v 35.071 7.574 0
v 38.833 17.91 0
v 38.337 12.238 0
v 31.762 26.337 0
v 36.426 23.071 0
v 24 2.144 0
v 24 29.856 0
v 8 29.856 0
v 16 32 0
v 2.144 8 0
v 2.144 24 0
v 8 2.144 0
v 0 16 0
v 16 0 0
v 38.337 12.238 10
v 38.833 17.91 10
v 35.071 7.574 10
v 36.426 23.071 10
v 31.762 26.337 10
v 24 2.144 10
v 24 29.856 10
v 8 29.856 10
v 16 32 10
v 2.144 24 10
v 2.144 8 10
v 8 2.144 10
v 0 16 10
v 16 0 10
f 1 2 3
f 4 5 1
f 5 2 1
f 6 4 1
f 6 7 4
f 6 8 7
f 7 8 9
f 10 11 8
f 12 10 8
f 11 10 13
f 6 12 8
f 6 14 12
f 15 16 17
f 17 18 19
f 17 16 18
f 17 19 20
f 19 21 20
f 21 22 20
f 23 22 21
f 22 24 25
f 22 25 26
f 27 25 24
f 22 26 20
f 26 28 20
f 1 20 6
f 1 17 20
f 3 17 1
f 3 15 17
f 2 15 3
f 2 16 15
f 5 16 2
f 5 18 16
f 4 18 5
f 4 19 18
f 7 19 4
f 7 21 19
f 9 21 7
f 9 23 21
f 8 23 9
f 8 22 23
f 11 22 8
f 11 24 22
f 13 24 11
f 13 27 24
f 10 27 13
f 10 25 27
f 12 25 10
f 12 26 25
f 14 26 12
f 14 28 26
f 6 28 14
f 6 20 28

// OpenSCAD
$fn = 32;

// ----------------------------------------------------------------------
// Eccentric disc: step, 10 mm thick
// ----------------------------------------------------------------------

// --- parameters (mm) ---
profile_height = 10;      // extrusion height
profile_points = 14;      // points of the closed outline

profile = [[0, 16], [2.144, 8], [8, 2.144], [16, 0], [24, 2.144], [35.071, 7.574], [38.337, 12.238], [38.833, 17.91], [36.426, 23.071], [31.762, 26.337], [24, 29.856], [16, 32], [8, 29.856], [2.144, 24]];  // single closed polygon, 14 points, counter clockwise

// --- the one profile operation ---
linear_extrude(height = profile_height) polygon(points = profile);
